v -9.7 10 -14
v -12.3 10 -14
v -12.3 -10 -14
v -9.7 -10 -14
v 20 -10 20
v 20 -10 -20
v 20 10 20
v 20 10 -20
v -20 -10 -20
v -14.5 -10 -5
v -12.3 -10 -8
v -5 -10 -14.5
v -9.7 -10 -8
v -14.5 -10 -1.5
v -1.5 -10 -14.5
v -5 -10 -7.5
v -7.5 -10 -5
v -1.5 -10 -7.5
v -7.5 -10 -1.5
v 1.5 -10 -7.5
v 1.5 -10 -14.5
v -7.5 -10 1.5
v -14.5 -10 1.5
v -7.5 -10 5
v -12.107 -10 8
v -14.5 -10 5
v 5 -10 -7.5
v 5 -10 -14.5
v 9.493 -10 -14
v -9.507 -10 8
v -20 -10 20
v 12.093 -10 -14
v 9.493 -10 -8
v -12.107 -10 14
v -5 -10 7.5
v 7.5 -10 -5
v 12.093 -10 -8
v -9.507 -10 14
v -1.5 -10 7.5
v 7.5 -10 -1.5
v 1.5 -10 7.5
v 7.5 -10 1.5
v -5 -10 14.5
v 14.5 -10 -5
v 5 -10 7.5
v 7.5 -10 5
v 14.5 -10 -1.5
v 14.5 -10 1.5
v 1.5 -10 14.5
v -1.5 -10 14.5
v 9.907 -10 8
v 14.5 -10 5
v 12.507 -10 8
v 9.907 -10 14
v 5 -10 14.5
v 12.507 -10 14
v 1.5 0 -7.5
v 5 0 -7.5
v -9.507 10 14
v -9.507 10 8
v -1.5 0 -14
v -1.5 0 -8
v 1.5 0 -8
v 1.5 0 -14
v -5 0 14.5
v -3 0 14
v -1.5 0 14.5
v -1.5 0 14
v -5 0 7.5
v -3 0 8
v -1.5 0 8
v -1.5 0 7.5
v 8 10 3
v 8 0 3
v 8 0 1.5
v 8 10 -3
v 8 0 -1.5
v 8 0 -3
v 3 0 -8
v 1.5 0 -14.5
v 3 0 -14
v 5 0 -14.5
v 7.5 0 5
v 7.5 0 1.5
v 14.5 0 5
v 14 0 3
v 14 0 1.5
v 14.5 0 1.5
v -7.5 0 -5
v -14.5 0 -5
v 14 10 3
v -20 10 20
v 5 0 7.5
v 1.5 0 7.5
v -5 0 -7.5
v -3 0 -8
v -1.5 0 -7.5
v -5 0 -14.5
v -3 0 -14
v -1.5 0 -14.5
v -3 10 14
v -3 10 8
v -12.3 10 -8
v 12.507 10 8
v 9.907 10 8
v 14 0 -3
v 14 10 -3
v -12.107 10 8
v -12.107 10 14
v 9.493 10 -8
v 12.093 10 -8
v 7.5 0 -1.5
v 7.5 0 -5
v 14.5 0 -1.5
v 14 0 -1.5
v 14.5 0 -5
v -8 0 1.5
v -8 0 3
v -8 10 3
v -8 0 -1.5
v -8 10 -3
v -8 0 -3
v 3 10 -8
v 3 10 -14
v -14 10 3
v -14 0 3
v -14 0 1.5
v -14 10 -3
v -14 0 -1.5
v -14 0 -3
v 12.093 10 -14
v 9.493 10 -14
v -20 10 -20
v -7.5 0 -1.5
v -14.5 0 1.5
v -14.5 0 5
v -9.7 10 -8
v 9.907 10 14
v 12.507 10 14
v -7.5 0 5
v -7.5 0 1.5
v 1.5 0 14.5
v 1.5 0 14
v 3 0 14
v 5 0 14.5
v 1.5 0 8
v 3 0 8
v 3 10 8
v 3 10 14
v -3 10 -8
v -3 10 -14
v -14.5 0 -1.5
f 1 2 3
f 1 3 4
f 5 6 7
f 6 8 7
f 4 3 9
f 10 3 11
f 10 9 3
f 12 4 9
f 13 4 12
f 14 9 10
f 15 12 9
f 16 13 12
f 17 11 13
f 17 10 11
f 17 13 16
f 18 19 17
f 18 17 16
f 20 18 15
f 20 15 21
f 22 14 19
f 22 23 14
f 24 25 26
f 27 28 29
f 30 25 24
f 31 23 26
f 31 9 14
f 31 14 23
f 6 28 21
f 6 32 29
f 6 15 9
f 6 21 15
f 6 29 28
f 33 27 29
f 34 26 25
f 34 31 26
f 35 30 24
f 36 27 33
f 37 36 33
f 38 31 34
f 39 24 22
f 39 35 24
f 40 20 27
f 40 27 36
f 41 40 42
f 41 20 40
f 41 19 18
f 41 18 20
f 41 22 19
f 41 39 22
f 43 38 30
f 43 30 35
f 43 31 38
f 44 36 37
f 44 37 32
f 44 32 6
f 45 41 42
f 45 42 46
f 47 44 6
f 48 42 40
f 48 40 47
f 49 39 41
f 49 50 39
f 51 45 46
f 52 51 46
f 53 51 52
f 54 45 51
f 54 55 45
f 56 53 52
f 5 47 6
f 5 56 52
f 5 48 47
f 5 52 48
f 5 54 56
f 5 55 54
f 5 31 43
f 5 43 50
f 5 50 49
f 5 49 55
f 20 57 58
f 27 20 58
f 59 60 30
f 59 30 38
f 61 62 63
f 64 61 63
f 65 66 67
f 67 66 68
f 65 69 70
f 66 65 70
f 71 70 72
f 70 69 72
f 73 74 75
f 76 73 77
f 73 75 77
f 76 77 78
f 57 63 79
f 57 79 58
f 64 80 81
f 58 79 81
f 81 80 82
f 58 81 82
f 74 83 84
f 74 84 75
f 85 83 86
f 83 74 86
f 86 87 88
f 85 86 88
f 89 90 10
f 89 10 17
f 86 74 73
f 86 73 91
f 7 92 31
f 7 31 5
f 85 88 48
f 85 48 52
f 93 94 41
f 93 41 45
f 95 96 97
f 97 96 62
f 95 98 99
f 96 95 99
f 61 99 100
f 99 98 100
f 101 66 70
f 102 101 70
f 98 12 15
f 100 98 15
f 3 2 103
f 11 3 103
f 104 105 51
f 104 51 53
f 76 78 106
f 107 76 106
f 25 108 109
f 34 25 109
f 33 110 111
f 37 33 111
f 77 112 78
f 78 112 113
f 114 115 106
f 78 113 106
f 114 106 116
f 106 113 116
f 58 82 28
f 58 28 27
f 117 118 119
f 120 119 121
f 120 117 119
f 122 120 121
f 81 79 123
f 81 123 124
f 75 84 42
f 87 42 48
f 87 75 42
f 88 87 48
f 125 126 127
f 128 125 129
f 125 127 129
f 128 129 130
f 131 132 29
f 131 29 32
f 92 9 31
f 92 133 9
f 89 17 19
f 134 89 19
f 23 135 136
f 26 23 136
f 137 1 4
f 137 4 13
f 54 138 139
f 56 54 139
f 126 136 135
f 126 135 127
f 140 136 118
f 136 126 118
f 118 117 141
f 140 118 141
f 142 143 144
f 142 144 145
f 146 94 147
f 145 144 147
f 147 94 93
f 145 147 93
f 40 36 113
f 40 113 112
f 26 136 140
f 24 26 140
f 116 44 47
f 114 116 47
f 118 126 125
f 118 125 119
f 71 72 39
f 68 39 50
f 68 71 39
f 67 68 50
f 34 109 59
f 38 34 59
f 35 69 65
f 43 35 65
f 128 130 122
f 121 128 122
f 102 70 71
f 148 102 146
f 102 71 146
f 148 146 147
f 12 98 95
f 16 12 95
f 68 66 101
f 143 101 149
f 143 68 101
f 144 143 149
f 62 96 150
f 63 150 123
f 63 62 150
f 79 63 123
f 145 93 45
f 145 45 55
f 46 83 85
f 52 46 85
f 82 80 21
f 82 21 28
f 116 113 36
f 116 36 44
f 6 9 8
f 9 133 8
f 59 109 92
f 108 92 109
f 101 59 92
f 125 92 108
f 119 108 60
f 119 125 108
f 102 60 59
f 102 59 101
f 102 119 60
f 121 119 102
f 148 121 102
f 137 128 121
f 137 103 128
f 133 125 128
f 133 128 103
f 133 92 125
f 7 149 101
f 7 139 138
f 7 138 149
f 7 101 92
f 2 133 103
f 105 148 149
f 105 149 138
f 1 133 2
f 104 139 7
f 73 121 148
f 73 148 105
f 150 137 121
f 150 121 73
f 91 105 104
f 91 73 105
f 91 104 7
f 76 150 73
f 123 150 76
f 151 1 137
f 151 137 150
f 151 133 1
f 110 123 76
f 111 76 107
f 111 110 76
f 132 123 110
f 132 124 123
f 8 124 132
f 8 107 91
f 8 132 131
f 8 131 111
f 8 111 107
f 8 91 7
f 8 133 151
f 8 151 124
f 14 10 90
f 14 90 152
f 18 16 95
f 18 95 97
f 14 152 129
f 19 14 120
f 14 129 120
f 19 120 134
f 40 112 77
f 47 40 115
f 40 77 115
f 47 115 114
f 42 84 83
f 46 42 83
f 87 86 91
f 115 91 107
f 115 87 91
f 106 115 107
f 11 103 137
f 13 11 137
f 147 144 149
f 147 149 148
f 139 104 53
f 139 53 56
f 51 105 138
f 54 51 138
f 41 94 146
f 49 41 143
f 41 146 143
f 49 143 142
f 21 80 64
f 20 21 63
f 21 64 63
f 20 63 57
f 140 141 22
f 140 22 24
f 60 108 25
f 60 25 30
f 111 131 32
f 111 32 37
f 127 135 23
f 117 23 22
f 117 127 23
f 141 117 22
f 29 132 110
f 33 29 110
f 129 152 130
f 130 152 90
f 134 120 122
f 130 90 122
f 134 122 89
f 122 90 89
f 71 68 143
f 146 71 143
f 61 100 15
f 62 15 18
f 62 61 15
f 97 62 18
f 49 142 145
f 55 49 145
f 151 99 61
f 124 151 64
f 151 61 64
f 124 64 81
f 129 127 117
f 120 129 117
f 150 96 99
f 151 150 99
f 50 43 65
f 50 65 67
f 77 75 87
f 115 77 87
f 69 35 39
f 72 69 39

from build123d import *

# Parameters (mm, degrees)
SKETCH_208_W             = 40
SKETCH_208_H             = 40
SKETCH_208_W_2           = 6
SKETCH_208_H_2           = 6
EXTRUDE_1_DEPTH          = 10
SKETCH_1_W               = 40
SKETCH_1_H               = 40
SKETCH_1_W_2             = 3.5
SKETCH_1_H_2             = 7
SKETCH_1_W_3             = 7
SKETCH_1_H_3             = 3.5
EXTRUDE_5_DEPTH          = 10
CUT_EXTRUDE_1_DEPTH      = 31
CUT_EXTRUDE_1_DEPTH_BACK = 31
SKETCH_1_6_W             = 2.6
SKETCH_1_6_H             = 6
CUT_EXTRUDE_2_DEPTH      = 31
CUT_EXTRUDE_2_DEPTH_BACK = 31
SKETCH_1_7_W             = 2.6
SKETCH_1_7_H             = 6
CUT_EXTRUDE_3_DEPTH      = 31
CUT_EXTRUDE_3_DEPTH_BACK = 31
SKETCH_1_8_W             = 2.6
SKETCH_1_8_H             = 6
CUT_EXTRUDE_4_DEPTH      = 31
CUT_EXTRUDE_4_DEPTH_BACK = 31
SKETCH_1_9_W             = 2.6
SKETCH_1_9_H             = 6


with BuildPart() as part:
    # Sketch 208 → Бобышка-Вытянуть1 (new body)
    with BuildSketch(Plane(origin=(0, 0, 0), x_dir=(1, 0, 0), z_dir=(0, 1, 0))):
        Rectangle(SKETCH_208_W, SKETCH_208_H)
        with Locations((11, 0)):
            Rectangle(SKETCH_208_W_2, SKETCH_208_H_2, mode=Mode.SUBTRACT)
        with Locations((-11, 0)):
            Rectangle(SKETCH_208_W_2, SKETCH_208_H_2, mode=Mode.SUBTRACT)
        with Locations((0, -11)):
            Rectangle(SKETCH_208_W_2, SKETCH_208_H_2, mode=Mode.SUBTRACT)
        with Locations((0, 11)):
            Rectangle(SKETCH_208_W_2, SKETCH_208_H_2, mode=Mode.SUBTRACT)
    extrude(amount=EXTRUDE_1_DEPTH)

    # Эскиз1 → Бобышка-Вытянуть5 (add)
    with BuildSketch(Plane.XZ):
        Rectangle(SKETCH_1_W, SKETCH_1_H)
        with Locations((-3.25, -11)):
            Rectangle(SKETCH_1_W_2, SKETCH_1_H_2, mode=Mode.SUBTRACT)
        with Locations((3.25, -11)):
            Rectangle(SKETCH_1_W_2, SKETCH_1_H_2, mode=Mode.SUBTRACT)
        with Locations((-11, -3.25)):
            Rectangle(SKETCH_1_W_3, SKETCH_1_H_3, mode=Mode.SUBTRACT)
        with Locations((-11, 3.25)):
            Rectangle(SKETCH_1_W_3, SKETCH_1_H_3, mode=Mode.SUBTRACT)
        with Locations((11, 3.25)):
            Rectangle(SKETCH_1_W_3, SKETCH_1_H_3, mode=Mode.SUBTRACT)
        with Locations((11, -3.25)):
            Rectangle(SKETCH_1_W_3, SKETCH_1_H_3, mode=Mode.SUBTRACT)
        with Locations((-3.25, 11)):
            Rectangle(SKETCH_1_W_2, SKETCH_1_H_2, mode=Mode.SUBTRACT)
        with Locations((3.25, 11)):
            Rectangle(SKETCH_1_W_2, SKETCH_1_H_2, mode=Mode.SUBTRACT)
    extrude(amount=EXTRUDE_5_DEPTH)

    # Эскиз1<6> → Вырез-Вытянуть1 (cut, two sides: drawn at the far end of the back side and taken through both)
    with BuildSketch(Plane.XZ.offset(-CUT_EXTRUDE_1_DEPTH_BACK)):
        with Locations((-10.806551552, 11)):
            Rectangle(SKETCH_1_6_W, SKETCH_1_6_H)
    extrude(amount=CUT_EXTRUDE_1_DEPTH + CUT_EXTRUDE_1_DEPTH_BACK, mode=Mode.SUBTRACT)

    # Эскиз1<7> → Вырез-Вытянуть2 (cut, two sides: drawn at the far end of the back side and taken through both)
    with BuildSketch(Plane.XZ.offset(-CUT_EXTRUDE_2_DEPTH_BACK)):
        with Locations((11.206646971, 11)):
            Rectangle(SKETCH_1_7_W, SKETCH_1_7_H)
    extrude(amount=CUT_EXTRUDE_2_DEPTH + CUT_EXTRUDE_2_DEPTH_BACK, mode=Mode.SUBTRACT)

    # Эскиз1<8> → Вырез-Вытянуть3 (cut, two sides: drawn at the far end of the back side and taken through both)
    with BuildSketch(Plane.XZ.offset(-CUT_EXTRUDE_3_DEPTH_BACK)):
        with Locations((10.793353029, -11)):
            Rectangle(SKETCH_1_8_W, SKETCH_1_8_H)
    extrude(amount=CUT_EXTRUDE_3_DEPTH + CUT_EXTRUDE_3_DEPTH_BACK, mode=Mode.SUBTRACT)

    # Эскиз1<9> → Вырез-Вытянуть4 (cut, two sides: drawn at the far end of the back side and taken through both)
    with BuildSketch(Plane.XZ.offset(-CUT_EXTRUDE_4_DEPTH_BACK)):
        with Locations((-11, -11)):
            Rectangle(SKETCH_1_9_W, SKETCH_1_9_H)
    extrude(amount=CUT_EXTRUDE_4_DEPTH + CUT_EXTRUDE_4_DEPTH_BACK, mode=Mode.SUBTRACT)


solid = part.part
